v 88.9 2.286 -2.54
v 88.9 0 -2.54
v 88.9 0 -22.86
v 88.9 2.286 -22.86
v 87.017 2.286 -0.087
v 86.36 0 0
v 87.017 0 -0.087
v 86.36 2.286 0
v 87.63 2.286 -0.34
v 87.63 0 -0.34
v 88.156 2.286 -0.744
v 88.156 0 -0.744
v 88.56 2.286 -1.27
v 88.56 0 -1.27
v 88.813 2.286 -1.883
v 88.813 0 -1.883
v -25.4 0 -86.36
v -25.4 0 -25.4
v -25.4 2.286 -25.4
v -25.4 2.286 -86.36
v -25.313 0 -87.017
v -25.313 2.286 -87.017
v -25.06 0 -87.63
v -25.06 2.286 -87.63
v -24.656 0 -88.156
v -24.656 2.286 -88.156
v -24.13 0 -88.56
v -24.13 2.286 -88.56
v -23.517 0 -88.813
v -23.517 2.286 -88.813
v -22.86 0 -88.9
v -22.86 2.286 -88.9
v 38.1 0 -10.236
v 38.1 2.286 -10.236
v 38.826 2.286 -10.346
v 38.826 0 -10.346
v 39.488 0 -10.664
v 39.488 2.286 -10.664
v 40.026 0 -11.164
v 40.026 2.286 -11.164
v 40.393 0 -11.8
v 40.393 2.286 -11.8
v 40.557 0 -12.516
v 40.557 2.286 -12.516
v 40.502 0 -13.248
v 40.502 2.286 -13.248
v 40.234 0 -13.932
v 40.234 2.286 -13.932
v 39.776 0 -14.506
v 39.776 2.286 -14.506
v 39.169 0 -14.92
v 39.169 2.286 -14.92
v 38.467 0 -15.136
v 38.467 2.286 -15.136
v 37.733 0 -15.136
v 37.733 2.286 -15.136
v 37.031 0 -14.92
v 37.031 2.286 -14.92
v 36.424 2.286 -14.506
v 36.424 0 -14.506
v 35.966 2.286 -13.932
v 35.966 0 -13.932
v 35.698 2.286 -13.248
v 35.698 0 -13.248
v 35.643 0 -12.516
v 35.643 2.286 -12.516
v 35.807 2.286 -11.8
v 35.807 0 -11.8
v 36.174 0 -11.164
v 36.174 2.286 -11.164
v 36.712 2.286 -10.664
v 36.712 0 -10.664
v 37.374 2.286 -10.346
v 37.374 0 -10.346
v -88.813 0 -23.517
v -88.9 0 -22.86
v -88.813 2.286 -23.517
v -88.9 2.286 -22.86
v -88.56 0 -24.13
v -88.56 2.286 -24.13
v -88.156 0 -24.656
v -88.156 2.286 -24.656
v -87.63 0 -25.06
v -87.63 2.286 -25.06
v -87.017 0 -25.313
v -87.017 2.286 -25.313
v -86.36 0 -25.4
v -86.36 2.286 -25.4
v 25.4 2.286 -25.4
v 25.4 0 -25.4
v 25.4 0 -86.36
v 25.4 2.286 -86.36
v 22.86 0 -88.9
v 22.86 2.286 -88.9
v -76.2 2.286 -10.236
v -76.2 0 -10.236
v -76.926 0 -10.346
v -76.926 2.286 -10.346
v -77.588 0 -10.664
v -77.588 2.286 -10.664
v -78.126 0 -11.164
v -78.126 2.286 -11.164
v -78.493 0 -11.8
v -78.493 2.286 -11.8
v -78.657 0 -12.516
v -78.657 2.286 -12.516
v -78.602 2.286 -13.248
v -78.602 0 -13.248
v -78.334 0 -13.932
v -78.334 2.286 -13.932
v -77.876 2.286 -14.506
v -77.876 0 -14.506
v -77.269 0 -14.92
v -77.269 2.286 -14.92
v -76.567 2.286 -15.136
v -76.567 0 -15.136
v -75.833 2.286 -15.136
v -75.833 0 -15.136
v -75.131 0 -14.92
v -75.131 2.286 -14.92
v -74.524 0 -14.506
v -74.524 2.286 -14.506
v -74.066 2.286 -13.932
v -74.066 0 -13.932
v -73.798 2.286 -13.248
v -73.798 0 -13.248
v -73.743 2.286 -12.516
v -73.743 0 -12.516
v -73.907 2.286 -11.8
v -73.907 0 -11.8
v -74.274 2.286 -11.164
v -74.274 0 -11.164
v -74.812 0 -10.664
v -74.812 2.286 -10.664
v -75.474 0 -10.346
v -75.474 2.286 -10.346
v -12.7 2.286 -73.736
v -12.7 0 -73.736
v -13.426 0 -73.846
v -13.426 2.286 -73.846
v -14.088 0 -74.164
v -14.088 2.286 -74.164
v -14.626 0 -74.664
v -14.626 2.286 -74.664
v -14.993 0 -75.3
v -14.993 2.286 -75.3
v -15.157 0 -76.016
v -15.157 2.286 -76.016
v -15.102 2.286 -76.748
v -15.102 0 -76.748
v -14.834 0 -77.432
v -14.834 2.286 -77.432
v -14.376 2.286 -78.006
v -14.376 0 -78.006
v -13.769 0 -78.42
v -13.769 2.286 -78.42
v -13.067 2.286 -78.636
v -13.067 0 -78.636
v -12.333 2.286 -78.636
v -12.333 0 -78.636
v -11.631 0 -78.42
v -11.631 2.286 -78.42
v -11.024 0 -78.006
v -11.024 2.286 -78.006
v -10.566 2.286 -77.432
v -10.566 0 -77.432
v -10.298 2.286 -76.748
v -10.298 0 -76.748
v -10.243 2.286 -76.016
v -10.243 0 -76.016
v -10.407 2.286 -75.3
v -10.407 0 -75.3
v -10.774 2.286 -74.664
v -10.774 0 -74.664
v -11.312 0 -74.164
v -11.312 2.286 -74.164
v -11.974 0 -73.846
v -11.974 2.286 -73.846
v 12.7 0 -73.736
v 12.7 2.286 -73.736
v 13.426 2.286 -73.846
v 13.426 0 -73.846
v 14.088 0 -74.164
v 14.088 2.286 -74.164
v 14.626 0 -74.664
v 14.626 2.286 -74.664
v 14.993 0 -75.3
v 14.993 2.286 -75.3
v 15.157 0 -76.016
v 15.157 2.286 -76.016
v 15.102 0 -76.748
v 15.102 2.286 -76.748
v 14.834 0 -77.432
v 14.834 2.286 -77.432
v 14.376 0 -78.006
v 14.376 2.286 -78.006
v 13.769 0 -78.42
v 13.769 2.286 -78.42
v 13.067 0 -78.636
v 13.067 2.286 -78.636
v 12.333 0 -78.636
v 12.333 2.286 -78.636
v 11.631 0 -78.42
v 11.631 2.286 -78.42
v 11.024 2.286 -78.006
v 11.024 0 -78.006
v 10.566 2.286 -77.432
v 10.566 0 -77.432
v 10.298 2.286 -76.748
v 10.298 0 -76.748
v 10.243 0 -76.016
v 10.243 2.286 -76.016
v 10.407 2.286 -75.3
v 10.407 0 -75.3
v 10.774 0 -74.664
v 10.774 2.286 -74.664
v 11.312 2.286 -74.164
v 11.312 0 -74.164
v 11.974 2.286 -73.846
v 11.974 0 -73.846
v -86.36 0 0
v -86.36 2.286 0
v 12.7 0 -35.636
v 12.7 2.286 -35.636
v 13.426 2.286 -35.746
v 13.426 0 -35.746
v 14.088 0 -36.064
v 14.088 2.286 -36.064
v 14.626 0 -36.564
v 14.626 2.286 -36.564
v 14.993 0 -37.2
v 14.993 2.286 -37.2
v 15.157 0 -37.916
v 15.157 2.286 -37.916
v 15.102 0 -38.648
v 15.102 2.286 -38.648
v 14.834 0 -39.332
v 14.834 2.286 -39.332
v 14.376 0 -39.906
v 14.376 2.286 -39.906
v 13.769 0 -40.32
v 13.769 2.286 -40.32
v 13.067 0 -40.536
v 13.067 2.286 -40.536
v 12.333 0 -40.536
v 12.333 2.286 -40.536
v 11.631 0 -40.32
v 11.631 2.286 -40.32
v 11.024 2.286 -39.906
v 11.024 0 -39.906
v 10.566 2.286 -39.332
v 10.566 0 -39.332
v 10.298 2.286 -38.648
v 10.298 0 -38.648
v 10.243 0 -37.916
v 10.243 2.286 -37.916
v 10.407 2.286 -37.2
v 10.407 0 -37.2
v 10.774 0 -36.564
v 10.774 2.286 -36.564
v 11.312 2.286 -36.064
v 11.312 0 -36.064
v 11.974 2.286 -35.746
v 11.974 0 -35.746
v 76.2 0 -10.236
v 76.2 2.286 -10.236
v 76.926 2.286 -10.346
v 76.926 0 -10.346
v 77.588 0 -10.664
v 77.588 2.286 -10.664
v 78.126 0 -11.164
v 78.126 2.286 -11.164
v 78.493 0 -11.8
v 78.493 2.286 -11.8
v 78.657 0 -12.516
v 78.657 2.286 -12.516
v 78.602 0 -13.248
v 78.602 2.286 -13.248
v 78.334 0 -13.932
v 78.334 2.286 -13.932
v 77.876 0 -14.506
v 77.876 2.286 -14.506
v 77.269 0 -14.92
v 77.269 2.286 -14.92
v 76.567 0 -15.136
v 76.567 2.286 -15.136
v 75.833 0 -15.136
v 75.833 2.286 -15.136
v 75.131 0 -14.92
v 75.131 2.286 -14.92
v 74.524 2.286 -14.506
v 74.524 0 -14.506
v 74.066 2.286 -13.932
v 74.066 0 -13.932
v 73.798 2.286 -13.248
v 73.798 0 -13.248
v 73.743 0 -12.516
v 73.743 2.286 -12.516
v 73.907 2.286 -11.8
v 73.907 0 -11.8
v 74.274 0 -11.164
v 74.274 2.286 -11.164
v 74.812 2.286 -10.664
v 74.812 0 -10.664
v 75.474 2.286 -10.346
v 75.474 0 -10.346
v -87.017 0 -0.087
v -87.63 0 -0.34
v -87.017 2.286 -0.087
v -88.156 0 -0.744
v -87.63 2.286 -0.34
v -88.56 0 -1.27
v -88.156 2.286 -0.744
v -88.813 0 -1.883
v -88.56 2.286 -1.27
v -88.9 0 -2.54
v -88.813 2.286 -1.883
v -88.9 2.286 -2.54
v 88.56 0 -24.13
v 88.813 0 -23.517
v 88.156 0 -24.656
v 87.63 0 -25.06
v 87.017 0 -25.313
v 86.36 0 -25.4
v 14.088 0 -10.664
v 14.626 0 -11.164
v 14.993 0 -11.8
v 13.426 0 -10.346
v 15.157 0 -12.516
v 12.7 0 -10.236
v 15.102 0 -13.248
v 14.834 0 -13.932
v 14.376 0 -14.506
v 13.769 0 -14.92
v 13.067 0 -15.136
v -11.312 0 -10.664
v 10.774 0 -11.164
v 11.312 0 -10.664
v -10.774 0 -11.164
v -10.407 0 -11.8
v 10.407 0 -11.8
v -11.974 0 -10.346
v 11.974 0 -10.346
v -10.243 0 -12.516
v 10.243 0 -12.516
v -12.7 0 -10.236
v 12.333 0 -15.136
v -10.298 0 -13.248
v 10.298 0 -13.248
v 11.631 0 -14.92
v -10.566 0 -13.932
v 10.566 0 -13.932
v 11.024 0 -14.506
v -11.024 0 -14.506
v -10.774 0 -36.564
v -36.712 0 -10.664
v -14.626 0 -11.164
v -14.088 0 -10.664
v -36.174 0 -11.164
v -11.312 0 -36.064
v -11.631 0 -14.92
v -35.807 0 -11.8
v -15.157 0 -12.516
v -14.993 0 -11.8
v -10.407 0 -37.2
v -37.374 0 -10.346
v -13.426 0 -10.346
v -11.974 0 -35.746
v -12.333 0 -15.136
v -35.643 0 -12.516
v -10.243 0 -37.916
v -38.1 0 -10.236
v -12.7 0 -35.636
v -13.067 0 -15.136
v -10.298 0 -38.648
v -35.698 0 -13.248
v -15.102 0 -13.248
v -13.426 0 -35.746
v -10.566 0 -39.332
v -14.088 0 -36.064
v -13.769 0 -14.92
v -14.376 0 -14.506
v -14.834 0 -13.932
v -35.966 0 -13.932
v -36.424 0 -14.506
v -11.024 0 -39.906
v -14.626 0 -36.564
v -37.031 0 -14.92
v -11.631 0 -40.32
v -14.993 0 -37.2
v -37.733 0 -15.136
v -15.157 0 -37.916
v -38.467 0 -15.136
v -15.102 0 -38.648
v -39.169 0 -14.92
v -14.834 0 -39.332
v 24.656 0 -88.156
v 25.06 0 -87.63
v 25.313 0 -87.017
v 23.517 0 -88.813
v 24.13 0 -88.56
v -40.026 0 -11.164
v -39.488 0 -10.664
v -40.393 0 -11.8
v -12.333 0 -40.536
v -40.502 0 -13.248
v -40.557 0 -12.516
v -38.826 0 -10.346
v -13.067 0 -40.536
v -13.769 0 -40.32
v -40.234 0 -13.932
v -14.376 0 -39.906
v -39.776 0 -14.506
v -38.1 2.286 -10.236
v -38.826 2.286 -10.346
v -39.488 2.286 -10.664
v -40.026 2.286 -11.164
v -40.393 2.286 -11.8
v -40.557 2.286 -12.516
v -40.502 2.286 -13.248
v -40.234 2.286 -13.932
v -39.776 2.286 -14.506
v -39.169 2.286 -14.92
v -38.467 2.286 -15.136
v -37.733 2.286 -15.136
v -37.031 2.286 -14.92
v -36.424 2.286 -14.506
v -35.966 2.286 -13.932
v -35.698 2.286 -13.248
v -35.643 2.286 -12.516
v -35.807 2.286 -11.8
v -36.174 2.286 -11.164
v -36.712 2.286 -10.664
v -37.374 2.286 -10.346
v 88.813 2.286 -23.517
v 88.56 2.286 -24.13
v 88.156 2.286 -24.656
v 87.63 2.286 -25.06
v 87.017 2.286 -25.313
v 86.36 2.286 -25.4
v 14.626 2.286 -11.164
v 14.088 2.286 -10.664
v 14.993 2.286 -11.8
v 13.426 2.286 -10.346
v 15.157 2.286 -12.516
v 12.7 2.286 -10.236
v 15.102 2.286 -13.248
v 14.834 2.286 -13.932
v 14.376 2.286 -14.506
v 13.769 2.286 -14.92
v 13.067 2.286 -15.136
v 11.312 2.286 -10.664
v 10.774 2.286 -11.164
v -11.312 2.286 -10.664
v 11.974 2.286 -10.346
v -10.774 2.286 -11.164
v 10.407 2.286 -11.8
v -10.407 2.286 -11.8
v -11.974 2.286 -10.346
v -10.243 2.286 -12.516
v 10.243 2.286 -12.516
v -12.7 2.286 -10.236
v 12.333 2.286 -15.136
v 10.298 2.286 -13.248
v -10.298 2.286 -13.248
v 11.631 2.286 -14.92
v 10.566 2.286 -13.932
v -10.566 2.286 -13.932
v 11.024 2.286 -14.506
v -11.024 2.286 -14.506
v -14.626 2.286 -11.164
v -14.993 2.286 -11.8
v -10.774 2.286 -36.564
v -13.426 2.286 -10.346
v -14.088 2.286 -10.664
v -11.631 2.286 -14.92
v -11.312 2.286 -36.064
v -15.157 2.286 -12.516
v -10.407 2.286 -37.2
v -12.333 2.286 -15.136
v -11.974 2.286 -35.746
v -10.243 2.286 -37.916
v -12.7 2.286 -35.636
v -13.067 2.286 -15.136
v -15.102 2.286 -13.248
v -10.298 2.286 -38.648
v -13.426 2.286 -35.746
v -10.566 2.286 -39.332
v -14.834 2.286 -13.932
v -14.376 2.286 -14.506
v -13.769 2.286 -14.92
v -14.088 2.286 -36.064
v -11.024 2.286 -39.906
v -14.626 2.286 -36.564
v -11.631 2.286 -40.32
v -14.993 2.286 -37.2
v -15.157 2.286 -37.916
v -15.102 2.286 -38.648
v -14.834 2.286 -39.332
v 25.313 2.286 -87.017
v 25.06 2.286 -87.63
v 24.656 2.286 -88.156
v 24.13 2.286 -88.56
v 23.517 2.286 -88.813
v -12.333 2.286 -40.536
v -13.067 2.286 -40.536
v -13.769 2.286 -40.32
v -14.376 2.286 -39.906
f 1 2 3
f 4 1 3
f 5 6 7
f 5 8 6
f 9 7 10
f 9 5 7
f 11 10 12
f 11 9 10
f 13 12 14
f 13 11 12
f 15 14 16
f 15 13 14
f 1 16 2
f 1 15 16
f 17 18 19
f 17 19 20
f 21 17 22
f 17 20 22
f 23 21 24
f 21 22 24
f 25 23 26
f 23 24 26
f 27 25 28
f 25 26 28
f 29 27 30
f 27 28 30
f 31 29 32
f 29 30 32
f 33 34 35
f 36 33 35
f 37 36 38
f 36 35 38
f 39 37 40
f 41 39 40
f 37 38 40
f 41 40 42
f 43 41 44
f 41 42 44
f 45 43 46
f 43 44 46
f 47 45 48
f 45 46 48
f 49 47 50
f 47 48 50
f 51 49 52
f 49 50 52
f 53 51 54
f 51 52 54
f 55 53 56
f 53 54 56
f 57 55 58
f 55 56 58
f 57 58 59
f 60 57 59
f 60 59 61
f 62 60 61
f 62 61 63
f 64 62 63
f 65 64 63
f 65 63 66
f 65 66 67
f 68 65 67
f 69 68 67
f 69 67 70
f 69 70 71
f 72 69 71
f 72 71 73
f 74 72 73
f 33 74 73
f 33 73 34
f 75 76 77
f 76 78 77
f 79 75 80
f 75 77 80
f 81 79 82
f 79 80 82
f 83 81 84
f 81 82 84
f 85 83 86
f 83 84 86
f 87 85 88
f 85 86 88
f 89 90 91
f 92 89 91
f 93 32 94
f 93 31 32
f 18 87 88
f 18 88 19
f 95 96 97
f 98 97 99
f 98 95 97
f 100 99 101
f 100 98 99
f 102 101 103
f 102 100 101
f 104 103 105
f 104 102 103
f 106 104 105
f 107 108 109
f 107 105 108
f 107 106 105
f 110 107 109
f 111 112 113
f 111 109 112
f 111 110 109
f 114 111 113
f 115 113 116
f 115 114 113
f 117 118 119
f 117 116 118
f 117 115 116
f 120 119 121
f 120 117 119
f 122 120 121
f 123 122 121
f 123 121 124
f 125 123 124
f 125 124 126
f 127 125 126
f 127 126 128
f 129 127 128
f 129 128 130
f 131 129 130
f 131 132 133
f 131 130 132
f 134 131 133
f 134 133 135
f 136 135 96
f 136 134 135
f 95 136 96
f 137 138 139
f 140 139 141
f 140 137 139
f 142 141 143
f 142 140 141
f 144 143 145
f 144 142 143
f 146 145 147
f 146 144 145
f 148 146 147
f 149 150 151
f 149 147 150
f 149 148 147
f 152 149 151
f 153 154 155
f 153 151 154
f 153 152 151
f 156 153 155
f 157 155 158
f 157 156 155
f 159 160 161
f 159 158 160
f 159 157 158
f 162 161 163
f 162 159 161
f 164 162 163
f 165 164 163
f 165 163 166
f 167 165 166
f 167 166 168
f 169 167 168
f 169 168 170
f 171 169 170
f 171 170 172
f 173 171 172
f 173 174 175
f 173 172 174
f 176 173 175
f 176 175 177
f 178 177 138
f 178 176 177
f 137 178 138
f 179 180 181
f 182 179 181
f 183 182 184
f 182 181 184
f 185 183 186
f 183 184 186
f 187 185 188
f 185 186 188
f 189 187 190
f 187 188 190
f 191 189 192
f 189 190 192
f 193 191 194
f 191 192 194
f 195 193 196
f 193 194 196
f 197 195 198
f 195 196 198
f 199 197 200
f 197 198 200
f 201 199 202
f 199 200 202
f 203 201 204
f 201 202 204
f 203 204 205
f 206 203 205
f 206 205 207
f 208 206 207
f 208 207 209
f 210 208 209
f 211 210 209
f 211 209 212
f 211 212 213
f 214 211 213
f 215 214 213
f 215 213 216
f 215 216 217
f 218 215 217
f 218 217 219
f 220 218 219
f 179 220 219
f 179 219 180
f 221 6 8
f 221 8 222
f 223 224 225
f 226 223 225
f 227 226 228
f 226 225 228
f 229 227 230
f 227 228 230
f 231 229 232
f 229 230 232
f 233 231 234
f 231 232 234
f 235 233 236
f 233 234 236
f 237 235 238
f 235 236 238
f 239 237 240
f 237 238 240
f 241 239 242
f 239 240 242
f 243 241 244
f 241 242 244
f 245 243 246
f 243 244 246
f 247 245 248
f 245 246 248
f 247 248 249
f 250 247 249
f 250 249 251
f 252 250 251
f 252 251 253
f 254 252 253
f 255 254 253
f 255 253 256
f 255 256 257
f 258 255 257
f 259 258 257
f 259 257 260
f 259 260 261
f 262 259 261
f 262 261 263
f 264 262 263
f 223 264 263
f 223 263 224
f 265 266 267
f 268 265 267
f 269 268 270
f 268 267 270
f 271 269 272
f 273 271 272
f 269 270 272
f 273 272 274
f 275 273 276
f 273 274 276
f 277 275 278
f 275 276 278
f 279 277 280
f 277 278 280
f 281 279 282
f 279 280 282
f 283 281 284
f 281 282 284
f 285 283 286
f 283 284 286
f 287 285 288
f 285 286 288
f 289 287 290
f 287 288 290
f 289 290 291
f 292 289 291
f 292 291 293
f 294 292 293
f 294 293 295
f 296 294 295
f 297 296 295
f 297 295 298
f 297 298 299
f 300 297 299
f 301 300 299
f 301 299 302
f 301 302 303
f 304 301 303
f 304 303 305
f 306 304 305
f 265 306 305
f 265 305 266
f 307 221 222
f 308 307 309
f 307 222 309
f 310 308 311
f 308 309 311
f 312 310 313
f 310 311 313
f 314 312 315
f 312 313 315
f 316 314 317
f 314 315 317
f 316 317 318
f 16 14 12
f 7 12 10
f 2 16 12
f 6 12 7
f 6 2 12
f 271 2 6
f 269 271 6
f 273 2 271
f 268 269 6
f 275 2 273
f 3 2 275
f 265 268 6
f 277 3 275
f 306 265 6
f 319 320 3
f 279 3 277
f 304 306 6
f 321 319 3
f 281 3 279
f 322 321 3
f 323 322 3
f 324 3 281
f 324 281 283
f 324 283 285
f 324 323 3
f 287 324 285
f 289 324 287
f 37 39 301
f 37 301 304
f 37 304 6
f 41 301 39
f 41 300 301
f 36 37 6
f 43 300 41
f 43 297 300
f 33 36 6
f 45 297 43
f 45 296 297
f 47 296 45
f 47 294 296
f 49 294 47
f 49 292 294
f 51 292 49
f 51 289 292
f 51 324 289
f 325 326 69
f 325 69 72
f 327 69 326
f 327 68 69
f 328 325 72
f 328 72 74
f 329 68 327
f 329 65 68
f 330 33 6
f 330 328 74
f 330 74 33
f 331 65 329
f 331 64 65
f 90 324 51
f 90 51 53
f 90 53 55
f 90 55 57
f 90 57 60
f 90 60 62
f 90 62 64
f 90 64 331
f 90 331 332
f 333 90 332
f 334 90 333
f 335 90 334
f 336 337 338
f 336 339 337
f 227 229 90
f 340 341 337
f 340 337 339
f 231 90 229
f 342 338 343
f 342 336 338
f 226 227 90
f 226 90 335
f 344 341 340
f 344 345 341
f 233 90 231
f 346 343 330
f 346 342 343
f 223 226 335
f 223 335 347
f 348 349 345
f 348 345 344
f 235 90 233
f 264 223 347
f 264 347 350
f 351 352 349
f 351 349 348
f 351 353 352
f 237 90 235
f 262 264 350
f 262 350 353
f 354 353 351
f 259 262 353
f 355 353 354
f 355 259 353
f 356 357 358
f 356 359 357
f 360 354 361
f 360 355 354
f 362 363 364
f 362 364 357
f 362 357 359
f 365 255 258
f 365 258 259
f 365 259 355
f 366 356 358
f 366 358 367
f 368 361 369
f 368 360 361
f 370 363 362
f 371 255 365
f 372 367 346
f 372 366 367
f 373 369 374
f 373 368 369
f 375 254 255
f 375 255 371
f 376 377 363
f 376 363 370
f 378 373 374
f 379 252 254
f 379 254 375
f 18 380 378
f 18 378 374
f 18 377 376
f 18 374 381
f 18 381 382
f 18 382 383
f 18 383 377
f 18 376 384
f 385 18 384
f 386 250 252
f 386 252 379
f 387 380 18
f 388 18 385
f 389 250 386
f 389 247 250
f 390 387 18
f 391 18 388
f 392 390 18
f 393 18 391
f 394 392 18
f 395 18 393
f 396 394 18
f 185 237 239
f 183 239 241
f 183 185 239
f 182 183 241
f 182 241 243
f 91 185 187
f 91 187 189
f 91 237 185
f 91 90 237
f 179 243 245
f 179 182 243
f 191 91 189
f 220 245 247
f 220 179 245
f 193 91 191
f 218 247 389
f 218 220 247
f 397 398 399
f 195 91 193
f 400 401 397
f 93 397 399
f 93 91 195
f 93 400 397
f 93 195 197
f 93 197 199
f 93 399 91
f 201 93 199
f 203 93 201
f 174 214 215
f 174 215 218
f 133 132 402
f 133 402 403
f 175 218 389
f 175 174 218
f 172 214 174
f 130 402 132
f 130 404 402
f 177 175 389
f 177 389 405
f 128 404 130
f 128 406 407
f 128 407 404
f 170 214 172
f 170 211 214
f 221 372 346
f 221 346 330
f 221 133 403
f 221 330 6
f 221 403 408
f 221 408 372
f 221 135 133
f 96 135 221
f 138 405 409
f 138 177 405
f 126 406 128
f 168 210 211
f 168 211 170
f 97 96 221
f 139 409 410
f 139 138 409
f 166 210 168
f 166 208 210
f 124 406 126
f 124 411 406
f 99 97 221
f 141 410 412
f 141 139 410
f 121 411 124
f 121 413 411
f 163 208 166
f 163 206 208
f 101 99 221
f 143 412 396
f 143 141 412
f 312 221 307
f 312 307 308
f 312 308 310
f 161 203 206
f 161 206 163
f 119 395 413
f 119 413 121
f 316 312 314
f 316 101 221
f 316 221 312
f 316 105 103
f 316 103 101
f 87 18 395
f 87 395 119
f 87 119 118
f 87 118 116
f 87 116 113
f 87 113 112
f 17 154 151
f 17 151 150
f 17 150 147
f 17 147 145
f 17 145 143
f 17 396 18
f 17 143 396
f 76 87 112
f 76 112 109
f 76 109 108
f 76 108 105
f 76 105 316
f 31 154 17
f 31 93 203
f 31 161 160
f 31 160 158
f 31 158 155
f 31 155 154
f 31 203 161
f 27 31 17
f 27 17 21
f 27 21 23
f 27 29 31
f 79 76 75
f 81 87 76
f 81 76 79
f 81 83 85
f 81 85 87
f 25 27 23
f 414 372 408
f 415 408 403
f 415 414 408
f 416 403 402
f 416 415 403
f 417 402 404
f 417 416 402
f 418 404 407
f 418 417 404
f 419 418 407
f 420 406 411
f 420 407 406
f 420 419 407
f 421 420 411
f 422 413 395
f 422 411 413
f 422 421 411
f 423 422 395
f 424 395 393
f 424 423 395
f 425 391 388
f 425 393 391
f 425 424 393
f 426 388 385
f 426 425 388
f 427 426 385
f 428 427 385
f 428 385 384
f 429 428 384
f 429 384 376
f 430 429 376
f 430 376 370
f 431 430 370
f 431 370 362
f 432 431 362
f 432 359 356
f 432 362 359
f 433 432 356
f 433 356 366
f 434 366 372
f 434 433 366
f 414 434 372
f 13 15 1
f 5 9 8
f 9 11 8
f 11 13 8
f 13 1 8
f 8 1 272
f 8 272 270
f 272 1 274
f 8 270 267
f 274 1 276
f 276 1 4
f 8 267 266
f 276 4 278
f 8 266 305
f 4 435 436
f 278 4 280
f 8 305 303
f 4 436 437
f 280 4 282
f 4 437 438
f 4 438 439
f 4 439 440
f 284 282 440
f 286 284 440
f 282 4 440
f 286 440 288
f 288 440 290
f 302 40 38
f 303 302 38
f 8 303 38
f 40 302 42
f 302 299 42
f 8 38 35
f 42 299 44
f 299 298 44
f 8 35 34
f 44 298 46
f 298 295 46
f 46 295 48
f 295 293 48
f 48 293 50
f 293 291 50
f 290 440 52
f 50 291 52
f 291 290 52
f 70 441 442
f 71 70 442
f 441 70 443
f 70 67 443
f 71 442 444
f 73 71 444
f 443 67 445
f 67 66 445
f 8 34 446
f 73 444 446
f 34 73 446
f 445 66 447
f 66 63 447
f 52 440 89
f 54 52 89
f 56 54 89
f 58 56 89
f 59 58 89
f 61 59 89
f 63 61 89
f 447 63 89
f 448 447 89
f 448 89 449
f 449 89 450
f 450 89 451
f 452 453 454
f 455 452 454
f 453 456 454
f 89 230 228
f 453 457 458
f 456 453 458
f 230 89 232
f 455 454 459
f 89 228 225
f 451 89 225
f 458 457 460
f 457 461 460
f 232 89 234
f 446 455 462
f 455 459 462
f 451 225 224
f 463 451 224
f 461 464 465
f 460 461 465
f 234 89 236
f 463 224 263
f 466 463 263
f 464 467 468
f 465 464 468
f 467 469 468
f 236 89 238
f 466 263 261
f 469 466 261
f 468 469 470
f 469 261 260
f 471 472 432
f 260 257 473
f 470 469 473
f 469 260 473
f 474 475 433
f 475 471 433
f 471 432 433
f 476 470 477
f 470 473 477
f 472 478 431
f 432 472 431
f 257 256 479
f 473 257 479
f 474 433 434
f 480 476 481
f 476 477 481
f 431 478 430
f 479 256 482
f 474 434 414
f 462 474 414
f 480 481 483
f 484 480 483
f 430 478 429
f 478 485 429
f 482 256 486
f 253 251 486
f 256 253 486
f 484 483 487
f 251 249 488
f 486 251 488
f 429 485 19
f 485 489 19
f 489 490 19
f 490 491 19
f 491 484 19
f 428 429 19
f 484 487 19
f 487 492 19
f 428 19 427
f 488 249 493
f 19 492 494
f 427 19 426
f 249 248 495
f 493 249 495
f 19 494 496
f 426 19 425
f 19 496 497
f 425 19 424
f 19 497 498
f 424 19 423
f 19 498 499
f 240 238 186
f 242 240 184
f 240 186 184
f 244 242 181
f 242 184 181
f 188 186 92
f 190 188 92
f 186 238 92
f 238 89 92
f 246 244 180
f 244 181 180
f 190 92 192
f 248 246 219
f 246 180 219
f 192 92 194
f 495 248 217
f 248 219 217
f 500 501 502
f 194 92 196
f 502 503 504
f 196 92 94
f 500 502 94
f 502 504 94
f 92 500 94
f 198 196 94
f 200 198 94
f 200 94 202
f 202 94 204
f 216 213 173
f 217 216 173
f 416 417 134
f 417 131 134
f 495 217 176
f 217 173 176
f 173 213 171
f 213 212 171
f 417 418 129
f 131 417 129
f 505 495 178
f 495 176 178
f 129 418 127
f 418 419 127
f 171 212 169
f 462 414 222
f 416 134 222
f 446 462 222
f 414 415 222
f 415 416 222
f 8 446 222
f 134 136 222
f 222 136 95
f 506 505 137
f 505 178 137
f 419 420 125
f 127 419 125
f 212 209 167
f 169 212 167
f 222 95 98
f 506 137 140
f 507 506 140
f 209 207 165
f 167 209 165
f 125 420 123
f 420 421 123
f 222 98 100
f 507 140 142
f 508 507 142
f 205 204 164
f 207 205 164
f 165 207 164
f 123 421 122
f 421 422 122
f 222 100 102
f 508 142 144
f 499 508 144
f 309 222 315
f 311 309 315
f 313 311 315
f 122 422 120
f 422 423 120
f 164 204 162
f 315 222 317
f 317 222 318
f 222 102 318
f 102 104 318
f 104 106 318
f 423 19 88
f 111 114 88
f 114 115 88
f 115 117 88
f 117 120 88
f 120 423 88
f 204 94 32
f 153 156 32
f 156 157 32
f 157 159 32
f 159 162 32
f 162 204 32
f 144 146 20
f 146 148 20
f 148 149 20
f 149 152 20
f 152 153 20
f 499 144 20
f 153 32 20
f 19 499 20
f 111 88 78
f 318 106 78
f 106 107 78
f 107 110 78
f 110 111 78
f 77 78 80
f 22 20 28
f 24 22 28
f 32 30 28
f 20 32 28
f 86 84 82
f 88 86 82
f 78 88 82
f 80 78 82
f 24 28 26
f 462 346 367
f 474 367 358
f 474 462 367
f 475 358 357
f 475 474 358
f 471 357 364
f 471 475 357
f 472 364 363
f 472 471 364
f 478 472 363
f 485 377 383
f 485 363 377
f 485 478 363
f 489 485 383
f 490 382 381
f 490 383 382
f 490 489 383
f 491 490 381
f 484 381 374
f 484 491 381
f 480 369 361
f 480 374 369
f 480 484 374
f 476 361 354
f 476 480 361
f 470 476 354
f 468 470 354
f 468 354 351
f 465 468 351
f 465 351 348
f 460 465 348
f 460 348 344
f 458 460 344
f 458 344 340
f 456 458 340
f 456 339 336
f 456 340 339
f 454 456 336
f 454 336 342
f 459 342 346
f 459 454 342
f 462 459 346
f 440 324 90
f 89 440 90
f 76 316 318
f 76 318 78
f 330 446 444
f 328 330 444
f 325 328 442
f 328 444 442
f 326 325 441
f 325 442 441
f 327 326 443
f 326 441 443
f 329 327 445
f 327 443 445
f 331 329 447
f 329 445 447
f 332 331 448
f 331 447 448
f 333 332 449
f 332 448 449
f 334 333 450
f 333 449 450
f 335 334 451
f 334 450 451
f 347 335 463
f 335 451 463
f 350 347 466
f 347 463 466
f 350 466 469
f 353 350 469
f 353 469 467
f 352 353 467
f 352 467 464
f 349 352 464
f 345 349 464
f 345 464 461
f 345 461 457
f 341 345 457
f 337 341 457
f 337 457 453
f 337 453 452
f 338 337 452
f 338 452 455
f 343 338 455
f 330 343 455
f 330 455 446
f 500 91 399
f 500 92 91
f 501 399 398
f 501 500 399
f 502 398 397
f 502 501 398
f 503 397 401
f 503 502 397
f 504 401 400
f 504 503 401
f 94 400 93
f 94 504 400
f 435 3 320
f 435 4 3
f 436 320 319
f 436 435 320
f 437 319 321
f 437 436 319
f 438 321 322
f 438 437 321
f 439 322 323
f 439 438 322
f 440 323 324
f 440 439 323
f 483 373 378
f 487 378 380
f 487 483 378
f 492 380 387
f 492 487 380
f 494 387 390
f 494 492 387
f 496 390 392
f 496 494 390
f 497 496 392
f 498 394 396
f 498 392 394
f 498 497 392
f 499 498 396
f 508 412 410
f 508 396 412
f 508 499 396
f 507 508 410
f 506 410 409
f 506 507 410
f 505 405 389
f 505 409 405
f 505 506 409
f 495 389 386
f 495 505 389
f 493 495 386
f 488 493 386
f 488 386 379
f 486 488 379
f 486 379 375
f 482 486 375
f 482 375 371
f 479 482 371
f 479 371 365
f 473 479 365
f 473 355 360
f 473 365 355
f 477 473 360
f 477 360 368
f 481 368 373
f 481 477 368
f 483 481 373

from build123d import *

# Parameters (mm, degrees)
BOSS_EXTRUDE1_DEPTH = 2.286
SKETCH3_R           = 2.4638
CUT_EXTRUDE2_DEPTH  = 126.744366856
FILLET1_R           = 2.54


with BuildPart() as part:
    # Sketch1 → Boss-Extrude1 (new body)
    with BuildSketch(Plane(origin=(0, 0, 0), x_dir=(1, 0, 0), z_dir=(0, 1, 0))):
        Polygon((0, 0), (88.9, 0), (88.9, 25.4), (25.4, 25.4), (25.4, 88.9), (0, 88.9), align=None)
    boss_extrude1 = extrude(amount=BOSS_EXTRUDE1_DEPTH)

    # Sketch3 → Cut-Extrude2 (cut, through all)
    with BuildSketch(Plane(origin=(0, 2.286, 0), x_dir=(1, 0, 0), z_dir=(0, 1, 0))):
        with Locations(Location((76.2, 12.7, 0), (0, 0, 270))):
            Circle(SKETCH3_R)
        with Locations(Location((12.7, 12.7, 0), (0, 0, 270))):
            Circle(SKETCH3_R)
        with Locations(Location((12.7, 76.2, 0), (0, 0, 270))):
            Circle(SKETCH3_R)
        with Locations(Location((12.7, 38.1, 0), (0, 0, 270))):
            Circle(SKETCH3_R)
        with Locations(Location((38.1, 12.7, 0), (0, 0, 270))):
            Circle(SKETCH3_R)
    cut_extrude2 = extrude(amount=-CUT_EXTRUDE2_DEPTH, mode=Mode.SUBTRACT)

    # Mirror1: Boss-Extrude1, Cut-Extrude2 across plane
    add(boss_extrude1.mirror(Plane(origin=(0, 2.286, -88.9), x_dir=(0, 0, 1), z_dir=(1, 0, 0))))
    add(cut_extrude2.mirror(Plane(origin=(0, 2.286, -88.9), x_dir=(0, 0, 1), z_dir=(1, 0, 0))), mode=Mode.SUBTRACT)

    # Fillet1
    fillet1_edges = [part.edges().sort_by_distance(p)[0] for p in [
        (25.4, 1.143, -88.9),
        (88.9, 1.143, -25.4),
        (88.9, 1.143, 0),
        (-25.4, 1.143, -88.9),
        (-88.9, 1.143, -25.4),
        (-88.9, 1.143, 0),
    ]]
    fillet(fillet1_edges, radius=FILLET1_R)


solid = part.part
